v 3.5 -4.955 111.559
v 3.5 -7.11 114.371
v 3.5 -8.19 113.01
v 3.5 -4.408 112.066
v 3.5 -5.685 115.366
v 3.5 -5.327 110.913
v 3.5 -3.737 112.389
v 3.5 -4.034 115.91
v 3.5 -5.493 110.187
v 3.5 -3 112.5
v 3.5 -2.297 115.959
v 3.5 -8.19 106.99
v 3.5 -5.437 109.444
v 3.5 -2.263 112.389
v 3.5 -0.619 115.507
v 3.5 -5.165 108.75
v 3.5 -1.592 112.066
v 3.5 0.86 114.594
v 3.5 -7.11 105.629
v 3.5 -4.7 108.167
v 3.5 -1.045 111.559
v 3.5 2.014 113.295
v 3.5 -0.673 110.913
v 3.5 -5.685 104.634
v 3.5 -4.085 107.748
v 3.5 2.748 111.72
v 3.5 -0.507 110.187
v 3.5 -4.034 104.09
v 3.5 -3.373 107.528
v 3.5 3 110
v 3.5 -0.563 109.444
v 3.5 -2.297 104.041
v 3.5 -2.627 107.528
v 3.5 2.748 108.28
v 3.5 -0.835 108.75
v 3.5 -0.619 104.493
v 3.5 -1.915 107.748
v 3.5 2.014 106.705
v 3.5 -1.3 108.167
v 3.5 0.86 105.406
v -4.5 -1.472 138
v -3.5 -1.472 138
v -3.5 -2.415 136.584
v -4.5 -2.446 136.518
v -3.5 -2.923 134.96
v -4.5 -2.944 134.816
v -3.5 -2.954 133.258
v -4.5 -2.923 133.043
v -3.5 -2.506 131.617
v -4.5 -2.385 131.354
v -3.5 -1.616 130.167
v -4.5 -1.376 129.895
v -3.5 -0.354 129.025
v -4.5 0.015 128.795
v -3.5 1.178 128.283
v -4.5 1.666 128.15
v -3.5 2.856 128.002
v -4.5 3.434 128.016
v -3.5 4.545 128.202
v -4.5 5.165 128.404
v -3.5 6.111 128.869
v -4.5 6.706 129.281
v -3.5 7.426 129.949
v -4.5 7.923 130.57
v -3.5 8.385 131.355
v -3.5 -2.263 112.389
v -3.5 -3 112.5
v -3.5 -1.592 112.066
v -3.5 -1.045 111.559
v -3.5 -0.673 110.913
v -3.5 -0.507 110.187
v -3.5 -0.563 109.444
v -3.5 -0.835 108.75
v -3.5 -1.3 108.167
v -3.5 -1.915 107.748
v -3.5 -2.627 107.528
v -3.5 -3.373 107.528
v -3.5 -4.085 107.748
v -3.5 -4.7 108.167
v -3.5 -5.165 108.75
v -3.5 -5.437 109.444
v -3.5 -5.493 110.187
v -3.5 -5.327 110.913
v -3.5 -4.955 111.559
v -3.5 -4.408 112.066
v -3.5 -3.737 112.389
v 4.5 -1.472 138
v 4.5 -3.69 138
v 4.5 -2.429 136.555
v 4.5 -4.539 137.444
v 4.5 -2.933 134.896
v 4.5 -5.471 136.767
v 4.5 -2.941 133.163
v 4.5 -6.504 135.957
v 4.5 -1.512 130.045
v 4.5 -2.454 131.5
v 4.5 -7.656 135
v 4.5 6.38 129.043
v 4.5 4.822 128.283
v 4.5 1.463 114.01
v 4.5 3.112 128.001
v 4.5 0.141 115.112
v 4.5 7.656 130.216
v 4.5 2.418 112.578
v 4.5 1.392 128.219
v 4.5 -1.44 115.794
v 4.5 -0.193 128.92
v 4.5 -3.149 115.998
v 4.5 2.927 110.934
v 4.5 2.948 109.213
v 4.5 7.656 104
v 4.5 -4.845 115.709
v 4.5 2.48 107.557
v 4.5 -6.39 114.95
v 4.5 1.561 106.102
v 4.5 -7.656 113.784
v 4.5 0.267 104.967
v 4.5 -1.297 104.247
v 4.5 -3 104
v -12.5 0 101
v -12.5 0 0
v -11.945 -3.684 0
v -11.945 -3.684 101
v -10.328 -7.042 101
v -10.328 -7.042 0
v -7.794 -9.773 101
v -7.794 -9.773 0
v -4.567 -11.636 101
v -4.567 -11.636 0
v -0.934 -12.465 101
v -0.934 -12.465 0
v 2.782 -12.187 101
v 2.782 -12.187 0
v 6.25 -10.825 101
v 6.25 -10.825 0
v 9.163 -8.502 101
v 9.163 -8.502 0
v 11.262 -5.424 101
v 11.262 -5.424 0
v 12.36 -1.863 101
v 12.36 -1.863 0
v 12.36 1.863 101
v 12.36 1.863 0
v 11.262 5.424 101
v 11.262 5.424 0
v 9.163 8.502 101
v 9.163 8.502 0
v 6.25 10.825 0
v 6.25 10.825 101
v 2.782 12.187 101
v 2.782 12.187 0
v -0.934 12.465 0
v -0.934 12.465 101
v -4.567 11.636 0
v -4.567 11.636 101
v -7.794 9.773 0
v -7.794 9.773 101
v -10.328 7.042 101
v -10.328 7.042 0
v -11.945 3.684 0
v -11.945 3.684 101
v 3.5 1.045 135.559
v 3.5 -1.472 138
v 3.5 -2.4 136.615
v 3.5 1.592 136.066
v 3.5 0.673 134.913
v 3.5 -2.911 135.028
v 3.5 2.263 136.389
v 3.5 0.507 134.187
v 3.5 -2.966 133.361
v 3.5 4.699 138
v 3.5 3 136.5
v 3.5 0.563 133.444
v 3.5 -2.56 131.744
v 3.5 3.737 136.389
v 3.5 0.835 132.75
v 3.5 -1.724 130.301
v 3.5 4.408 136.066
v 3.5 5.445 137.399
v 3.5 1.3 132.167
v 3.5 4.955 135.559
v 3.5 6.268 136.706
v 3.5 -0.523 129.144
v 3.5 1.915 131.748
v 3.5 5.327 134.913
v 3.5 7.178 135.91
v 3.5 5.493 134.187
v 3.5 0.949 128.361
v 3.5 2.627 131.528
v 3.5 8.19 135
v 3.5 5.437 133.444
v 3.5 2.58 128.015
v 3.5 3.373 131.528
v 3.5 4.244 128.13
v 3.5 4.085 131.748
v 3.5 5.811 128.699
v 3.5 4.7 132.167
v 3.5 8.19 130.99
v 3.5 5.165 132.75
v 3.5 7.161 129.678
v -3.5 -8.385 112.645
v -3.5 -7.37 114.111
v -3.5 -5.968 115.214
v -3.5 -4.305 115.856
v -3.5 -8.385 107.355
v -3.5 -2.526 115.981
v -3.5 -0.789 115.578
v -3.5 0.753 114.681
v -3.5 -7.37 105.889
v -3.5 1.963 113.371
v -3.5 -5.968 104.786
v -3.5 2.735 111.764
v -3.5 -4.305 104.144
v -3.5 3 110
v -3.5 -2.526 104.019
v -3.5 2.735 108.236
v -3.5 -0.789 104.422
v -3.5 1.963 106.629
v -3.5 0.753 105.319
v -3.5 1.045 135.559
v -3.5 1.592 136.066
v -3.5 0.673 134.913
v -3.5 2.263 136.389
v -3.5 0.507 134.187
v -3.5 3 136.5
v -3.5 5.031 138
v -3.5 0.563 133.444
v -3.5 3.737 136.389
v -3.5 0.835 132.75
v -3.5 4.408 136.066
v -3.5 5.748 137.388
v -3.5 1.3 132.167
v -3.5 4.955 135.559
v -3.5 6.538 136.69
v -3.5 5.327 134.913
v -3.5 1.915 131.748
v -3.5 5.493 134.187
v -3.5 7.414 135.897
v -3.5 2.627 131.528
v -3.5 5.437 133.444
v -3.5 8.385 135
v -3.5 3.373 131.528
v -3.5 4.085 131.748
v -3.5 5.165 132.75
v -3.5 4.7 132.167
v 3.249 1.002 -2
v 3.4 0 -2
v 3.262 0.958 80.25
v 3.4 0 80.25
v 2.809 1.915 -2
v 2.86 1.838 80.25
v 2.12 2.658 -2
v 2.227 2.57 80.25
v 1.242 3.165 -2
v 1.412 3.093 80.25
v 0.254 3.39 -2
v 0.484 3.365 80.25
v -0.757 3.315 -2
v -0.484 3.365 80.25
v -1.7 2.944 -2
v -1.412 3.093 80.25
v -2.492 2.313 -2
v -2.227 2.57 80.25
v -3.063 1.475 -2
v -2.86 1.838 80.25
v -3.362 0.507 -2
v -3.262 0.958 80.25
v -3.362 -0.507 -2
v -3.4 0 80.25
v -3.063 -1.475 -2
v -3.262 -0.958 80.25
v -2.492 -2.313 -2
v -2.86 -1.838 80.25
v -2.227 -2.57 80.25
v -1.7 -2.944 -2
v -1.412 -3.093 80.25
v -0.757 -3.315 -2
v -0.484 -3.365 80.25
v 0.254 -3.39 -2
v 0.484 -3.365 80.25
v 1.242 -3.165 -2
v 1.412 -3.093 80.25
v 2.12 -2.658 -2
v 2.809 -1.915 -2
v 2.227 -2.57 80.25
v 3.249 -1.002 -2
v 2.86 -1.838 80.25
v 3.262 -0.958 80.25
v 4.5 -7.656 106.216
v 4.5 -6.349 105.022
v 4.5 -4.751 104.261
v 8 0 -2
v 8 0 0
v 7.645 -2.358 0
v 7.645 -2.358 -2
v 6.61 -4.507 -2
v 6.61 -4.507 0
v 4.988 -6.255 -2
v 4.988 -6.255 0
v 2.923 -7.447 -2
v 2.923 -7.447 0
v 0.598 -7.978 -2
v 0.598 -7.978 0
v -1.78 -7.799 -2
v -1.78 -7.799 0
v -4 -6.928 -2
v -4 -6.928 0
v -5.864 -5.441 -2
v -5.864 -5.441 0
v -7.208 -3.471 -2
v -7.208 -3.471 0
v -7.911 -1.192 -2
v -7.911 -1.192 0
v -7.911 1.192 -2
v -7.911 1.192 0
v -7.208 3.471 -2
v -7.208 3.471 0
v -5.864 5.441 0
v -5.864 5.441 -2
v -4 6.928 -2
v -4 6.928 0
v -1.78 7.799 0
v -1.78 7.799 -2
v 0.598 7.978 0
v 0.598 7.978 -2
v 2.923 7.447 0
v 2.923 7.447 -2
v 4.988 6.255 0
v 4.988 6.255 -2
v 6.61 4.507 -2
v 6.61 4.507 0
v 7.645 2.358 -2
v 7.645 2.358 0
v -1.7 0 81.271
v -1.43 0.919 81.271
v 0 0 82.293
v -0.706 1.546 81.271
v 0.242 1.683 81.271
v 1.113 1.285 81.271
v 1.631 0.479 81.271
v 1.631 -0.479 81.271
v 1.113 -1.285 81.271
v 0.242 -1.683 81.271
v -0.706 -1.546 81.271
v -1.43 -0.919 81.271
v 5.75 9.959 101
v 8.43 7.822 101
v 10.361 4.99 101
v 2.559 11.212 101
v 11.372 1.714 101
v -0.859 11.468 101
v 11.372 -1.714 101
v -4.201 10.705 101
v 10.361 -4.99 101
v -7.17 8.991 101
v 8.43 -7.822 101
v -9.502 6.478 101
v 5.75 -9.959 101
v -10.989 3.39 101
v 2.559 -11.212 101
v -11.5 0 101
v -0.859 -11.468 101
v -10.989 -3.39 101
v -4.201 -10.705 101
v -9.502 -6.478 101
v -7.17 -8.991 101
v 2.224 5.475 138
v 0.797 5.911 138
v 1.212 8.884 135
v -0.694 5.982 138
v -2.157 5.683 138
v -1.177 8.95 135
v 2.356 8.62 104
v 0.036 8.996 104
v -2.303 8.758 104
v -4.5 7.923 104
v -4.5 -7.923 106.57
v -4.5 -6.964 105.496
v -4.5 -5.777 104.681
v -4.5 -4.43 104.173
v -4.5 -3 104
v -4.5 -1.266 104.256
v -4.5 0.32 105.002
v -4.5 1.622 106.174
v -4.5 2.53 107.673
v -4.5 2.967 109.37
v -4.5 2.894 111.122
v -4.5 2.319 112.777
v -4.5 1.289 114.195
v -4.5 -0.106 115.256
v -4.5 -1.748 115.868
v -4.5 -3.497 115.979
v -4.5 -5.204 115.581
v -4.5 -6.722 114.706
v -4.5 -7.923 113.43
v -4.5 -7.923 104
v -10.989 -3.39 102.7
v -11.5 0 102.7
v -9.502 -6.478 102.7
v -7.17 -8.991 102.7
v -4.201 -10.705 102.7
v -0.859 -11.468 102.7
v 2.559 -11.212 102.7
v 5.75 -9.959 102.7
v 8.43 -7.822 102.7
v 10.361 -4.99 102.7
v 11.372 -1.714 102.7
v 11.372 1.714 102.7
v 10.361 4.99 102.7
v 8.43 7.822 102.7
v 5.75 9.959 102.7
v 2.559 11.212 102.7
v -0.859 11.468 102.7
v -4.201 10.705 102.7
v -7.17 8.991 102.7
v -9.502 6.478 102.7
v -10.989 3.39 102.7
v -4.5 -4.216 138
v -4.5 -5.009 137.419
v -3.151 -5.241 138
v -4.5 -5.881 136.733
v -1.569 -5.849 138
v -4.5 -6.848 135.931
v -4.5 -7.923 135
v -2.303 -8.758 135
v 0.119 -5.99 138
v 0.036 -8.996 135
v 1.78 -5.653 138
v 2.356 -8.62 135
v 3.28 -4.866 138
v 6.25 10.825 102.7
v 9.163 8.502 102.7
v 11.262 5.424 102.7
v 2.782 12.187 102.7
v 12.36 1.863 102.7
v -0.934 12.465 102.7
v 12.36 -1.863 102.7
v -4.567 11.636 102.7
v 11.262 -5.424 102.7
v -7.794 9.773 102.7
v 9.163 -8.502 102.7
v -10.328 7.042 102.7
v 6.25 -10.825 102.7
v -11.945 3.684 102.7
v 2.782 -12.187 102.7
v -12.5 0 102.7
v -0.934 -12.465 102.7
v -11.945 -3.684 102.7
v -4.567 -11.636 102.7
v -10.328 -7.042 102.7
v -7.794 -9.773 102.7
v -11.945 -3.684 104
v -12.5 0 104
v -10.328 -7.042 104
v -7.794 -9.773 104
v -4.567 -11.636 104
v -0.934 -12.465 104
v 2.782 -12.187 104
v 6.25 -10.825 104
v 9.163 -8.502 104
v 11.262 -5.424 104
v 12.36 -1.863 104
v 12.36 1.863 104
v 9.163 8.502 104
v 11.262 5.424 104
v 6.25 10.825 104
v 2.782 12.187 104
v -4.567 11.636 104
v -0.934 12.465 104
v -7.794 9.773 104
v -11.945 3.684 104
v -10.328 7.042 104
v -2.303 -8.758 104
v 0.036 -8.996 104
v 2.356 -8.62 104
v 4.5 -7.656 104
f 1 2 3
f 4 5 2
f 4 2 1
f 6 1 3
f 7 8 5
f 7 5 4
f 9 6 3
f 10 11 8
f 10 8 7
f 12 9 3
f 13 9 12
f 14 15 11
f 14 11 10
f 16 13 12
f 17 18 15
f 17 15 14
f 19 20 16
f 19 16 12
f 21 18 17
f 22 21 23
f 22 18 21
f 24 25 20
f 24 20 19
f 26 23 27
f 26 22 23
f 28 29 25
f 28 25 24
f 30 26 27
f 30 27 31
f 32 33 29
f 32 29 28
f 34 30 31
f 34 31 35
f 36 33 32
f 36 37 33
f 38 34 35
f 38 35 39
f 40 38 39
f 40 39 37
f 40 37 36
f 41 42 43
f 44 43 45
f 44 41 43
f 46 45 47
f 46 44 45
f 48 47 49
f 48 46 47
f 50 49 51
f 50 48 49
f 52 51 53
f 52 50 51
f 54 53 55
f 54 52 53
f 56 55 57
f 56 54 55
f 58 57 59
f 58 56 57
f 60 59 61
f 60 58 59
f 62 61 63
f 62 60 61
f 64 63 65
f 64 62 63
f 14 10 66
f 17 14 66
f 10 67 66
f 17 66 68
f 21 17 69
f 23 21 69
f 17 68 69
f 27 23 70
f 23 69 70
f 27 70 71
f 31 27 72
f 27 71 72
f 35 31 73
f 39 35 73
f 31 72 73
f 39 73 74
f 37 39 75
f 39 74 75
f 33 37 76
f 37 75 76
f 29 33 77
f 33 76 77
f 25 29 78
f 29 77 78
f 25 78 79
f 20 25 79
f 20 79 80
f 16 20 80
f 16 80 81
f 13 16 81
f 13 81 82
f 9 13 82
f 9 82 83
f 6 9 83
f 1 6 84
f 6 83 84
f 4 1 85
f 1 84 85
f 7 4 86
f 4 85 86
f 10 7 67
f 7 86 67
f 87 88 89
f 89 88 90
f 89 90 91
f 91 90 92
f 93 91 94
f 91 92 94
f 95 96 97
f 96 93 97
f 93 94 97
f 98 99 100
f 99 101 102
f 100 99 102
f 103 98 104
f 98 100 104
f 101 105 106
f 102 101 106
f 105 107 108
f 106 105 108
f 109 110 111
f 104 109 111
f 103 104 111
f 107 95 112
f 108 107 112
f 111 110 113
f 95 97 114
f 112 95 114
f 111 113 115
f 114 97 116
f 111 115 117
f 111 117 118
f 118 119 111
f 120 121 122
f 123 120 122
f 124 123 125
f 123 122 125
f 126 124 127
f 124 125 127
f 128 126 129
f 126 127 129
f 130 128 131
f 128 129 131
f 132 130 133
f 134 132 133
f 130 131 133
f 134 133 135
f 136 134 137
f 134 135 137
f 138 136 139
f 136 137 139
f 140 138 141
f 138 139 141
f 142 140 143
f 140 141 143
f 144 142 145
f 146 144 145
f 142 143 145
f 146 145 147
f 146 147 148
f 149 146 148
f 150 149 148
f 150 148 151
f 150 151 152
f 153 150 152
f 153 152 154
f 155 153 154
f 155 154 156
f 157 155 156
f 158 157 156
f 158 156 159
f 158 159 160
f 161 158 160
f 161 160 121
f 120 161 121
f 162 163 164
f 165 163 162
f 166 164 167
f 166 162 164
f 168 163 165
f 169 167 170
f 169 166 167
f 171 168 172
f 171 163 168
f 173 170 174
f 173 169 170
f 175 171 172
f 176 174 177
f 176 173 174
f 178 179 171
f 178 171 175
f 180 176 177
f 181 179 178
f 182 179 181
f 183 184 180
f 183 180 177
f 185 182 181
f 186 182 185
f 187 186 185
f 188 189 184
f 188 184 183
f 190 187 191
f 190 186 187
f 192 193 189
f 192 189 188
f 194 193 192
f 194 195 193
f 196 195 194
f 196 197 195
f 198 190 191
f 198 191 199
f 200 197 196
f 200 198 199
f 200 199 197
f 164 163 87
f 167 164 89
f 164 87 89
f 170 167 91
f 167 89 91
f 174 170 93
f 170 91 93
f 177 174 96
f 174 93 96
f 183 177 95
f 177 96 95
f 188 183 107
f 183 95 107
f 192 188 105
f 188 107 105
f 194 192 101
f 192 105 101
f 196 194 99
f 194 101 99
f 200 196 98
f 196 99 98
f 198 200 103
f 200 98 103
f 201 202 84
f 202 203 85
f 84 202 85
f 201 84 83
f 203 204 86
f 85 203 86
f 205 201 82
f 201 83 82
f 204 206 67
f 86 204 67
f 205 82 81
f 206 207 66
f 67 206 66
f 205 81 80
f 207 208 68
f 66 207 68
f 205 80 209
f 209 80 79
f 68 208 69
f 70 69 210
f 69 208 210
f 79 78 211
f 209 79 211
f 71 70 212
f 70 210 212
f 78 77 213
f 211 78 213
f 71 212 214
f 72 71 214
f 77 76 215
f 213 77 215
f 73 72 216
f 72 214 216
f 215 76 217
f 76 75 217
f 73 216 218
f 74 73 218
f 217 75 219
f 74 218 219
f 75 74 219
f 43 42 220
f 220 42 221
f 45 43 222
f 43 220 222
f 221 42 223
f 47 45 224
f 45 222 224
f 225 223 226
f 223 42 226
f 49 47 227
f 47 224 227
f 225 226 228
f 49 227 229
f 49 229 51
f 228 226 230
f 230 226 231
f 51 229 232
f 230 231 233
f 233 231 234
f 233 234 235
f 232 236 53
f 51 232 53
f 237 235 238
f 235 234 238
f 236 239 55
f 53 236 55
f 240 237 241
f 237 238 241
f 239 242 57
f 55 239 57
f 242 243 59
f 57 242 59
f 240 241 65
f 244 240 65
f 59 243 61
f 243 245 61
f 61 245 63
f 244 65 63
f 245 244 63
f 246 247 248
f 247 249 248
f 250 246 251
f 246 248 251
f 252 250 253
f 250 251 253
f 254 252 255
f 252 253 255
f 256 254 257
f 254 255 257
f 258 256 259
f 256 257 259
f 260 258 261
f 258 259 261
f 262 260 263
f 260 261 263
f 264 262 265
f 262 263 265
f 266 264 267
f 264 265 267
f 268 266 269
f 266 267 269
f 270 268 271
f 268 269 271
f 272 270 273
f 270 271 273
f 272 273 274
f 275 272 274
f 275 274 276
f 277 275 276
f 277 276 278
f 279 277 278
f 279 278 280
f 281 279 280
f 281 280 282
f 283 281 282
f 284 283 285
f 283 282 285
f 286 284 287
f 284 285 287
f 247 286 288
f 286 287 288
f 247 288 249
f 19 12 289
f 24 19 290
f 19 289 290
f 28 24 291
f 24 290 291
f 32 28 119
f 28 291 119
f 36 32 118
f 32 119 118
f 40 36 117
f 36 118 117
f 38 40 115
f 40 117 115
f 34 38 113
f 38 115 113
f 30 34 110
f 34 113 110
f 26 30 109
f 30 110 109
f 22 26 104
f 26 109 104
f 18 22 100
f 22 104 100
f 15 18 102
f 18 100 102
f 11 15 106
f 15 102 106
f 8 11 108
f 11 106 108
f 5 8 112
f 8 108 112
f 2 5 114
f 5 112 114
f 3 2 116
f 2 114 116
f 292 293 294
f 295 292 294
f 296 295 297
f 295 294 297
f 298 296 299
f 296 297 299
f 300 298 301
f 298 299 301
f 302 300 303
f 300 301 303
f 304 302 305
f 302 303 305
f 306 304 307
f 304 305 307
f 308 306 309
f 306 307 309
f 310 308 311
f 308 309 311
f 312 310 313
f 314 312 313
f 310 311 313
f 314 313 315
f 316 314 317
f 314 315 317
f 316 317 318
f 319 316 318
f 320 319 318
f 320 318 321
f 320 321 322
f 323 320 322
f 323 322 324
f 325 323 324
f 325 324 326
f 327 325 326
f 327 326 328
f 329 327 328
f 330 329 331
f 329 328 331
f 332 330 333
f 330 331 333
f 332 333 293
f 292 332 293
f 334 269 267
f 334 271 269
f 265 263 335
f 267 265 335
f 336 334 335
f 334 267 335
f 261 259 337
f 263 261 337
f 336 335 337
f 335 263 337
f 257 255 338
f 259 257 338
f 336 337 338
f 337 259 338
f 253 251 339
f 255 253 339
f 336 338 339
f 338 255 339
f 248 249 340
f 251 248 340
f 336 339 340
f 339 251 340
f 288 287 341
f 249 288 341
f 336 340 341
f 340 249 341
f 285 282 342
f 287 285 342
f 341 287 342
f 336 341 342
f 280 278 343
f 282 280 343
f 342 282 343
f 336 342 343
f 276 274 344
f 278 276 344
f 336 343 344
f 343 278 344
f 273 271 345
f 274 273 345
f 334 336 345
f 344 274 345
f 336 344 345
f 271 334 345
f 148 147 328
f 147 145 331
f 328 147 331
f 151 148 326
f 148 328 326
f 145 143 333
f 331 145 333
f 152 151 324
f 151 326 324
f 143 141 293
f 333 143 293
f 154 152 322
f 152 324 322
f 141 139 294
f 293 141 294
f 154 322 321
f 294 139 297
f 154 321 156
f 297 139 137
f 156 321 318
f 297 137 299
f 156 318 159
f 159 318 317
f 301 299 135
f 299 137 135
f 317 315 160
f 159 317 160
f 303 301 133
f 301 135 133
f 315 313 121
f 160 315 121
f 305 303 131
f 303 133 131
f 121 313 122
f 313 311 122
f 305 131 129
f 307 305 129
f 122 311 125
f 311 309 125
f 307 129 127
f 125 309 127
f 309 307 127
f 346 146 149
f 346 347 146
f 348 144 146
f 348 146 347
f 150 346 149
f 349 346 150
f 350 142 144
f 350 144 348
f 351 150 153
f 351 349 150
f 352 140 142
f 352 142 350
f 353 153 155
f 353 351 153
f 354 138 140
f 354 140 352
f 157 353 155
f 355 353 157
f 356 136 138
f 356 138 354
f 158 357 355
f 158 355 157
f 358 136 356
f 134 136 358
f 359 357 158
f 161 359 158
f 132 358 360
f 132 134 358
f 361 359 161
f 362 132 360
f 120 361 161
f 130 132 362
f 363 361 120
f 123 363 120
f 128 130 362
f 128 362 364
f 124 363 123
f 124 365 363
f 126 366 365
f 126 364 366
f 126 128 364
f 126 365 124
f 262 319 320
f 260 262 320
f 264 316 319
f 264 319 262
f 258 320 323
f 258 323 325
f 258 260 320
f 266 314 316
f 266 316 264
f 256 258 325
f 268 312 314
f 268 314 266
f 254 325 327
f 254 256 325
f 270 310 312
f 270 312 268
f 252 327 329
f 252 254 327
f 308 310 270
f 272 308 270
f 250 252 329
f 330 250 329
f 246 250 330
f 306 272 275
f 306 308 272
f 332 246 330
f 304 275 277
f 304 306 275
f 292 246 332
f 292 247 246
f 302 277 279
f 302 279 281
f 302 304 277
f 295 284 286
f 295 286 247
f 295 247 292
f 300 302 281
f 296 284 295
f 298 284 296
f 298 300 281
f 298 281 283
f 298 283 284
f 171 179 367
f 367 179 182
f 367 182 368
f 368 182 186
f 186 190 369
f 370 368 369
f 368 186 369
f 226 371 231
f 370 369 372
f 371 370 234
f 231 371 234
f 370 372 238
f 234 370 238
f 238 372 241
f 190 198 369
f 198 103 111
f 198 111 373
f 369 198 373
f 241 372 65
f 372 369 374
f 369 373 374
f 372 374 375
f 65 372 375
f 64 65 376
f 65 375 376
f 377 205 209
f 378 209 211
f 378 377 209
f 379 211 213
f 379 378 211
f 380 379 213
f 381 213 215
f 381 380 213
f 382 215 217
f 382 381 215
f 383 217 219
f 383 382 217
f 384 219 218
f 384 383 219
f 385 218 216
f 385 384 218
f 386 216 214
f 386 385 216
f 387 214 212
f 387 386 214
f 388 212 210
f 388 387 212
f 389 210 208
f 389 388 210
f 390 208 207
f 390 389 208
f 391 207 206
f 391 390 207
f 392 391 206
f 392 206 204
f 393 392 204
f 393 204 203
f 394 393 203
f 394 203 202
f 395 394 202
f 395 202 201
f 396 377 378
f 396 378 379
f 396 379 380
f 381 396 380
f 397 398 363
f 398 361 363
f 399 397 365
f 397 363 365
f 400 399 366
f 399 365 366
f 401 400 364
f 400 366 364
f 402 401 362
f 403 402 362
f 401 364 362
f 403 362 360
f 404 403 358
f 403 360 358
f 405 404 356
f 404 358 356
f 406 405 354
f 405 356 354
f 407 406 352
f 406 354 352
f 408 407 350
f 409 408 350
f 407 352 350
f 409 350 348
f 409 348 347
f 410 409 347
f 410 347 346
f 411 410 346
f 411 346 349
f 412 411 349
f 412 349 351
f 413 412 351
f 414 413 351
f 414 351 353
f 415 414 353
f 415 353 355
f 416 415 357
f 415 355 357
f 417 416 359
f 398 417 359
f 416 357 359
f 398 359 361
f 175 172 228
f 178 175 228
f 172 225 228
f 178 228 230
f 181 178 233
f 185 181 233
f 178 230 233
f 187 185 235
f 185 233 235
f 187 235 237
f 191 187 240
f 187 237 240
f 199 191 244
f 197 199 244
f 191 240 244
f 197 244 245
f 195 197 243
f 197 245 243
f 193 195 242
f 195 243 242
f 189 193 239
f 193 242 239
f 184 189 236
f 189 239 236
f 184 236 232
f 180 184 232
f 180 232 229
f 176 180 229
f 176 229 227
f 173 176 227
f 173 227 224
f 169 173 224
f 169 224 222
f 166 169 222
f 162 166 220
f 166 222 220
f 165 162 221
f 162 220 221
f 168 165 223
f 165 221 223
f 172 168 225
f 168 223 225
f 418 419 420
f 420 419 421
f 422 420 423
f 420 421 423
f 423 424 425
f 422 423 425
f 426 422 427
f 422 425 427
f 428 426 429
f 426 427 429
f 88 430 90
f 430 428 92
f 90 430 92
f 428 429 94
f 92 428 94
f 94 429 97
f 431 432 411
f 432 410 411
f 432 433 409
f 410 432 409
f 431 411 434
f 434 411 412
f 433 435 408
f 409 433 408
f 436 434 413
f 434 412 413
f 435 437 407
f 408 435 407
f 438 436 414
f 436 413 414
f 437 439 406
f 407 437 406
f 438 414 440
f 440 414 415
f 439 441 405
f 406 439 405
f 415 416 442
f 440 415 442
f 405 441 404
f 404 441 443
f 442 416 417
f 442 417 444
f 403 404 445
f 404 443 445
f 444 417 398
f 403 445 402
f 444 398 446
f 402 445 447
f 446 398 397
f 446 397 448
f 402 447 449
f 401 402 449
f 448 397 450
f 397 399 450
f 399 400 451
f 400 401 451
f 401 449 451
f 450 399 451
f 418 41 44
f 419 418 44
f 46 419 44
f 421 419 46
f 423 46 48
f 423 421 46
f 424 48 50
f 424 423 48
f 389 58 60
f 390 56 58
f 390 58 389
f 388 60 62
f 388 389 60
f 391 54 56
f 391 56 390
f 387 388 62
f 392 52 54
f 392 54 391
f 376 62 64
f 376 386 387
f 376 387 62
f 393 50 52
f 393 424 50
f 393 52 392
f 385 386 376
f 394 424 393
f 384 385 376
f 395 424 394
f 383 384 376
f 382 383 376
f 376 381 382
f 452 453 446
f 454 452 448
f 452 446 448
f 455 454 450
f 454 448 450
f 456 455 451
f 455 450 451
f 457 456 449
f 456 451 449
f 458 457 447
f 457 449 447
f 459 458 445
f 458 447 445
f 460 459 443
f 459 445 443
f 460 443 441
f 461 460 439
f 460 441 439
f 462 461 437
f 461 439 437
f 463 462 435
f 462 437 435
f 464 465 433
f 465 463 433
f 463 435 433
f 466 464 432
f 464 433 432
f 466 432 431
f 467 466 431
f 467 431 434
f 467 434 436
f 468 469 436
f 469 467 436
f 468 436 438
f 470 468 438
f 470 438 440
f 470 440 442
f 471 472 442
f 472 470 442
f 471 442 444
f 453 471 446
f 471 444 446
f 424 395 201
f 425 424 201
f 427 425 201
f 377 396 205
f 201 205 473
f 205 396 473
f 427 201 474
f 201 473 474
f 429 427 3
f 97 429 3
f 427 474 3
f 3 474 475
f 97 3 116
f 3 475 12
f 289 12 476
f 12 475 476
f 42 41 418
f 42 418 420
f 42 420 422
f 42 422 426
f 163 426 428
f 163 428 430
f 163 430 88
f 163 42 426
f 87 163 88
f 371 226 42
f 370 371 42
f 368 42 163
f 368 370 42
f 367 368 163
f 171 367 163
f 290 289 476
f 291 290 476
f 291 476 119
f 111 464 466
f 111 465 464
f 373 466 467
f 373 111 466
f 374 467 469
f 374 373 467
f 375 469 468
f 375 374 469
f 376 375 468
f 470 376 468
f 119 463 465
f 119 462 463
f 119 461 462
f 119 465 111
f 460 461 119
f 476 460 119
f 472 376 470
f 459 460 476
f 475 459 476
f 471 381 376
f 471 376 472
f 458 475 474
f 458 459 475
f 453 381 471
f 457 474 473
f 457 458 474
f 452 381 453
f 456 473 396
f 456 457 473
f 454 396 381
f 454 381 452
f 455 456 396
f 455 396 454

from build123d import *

# Parameters (mm, degrees)
SKETCH_1_R               = 12.5
EXTRUDE_1_DEPTH          = 104
SKETCH_6_W               = 1
SKETCH_6_H               = 1.7
SKETCH_7_R               = 8
EXTRUDE_2_DEPTH          = 2
HOLE_WIZARD_M8_1_D       = 6.8
HOLE_WIZARD_M8_1_DEPTH   = 82.25
HOLE_WIZARD_M8_1_TIP     = 2.042926105
SKETCH_9_R               = 9
EXTRUDE_3_DEPTH          = 34
CUT_EXTRUDE_1_DEPTH      = 140.127639238
CUT_EXTRUDE_1_DEPTH_BACK = 140.127639238
SKETCH_8_W               = 34
SKETCH_8_H               = 10.443945465
CHAMFER_1_SIZE           = 3
HOLE_WIZARD_5_0_5_1_D    = 5
SKETCH_13_R              = 6
CUT_EXTRUDE_3_DEPTH      = 1


with BuildPart() as part:
    # 草图1 → 凸台-拉伸1 (new body)
    with BuildSketch(Plane.XY):
        with Locations(Location((0, 0, 0), (0, 0, 180))):
            Circle(SKETCH_1_R)
    extrude(amount=EXTRUDE_1_DEPTH)

    # 草图6 → 切除-旋转1 (revolve, cut)
    with BuildSketch(Plane(origin=(0, 0, 0), x_dir=(1, 0, 0), z_dir=(0, 1, 0))):
        with Locations((-12, -101.85)):
            Rectangle(SKETCH_6_W, SKETCH_6_H)
    revolve(axis=Axis((0, 0, 0), (0, 0, 1)), mode=Mode.SUBTRACT)

    # 草图7 → 凸台-拉伸2 (add)
    with BuildSketch(Plane(origin=(0, 0, 0), x_dir=(-1, 0, 0), z_dir=(0, 0, -1))):
        with Locations(Location((0, 0, 0), (0, 0, 180))):
            Circle(SKETCH_7_R)
    extrude(amount=EXTRUDE_2_DEPTH)

    # M8 螺纹孔1
    with Locations(Plane(origin=(0, 0, -2), x_dir=(-1, 0, 0), z_dir=(0, 0, -1))):
        with Locations((0, 0)):
            Hole(HOLE_WIZARD_M8_1_D / 2, depth=HOLE_WIZARD_M8_1_DEPTH)
            with Locations((0, 0, -(HOLE_WIZARD_M8_1_DEPTH + HOLE_WIZARD_M8_1_TIP / 2))):  # 118° drill point
                Cone(0, HOLE_WIZARD_M8_1_D / 2, HOLE_WIZARD_M8_1_TIP, mode=Mode.SUBTRACT)

    # 草图9 → 凸台-拉伸3 (add)
    with BuildSketch(Plane.XY.offset(104)):
        with Locations((-0.231058247, 0)):
            Circle(SKETCH_9_R)
    extrude(amount=EXTRUDE_3_DEPTH)

    # 草图8 → 切除-拉伸1 (cut, two sides: drawn at the far end of the back side and taken through both)
    with BuildSketch(Plane(origin=(0, 0, 0), x_dir=(0, 0, -1), z_dir=(0, 1, 0)).offset(-CUT_EXTRUDE_1_DEPTH_BACK)):
        with Locations((-121, 9.721972732)):
            Rectangle(SKETCH_8_W, SKETCH_8_H)
        with Locations((-121, -9.721972732)):
            Rectangle(SKETCH_8_W, SKETCH_8_H)
    extrude(amount=CUT_EXTRUDE_1_DEPTH + CUT_EXTRUDE_1_DEPTH_BACK, mode=Mode.SUBTRACT)

    # 倒角1
    chamfer_1_edges = [part.edges().sort_by_distance(p)[0] for p in [
        (0.035783968, -8.99604331, 138),
        (0.035783968, 8.99604331, 138),
    ]]
    chamfer(chamfer_1_edges, length=CHAMFER_1_SIZE)

    # Ø5.0 (5) 直径孔1 (through all)
    with Locations(Plane(origin=(4.5, 0, 0), x_dir=(0, 0, -1), z_dir=(1, 0, 0))):
        with Locations((-110, -3), (-134, 3)):
            Hole(HOLE_WIZARD_5_0_5_1_D / 2)

    # 草图13 → 切除-拉伸3 (cut)
    with BuildSketch(Plane(origin=(4.5, 0, 0), x_dir=(0, 0, -1), z_dir=(1, 0, 0))):
        with Locations((-134, 3)):
            Circle(SKETCH_13_R)
        with Locations((-110, -3)):
            Circle(SKETCH_13_R)
    cut_extrude_3 = extrude(amount=-CUT_EXTRUDE_3_DEPTH, mode=Mode.SUBTRACT)

    # 镜向1: 切除-拉伸3 across plane
    add(cut_extrude_3.mirror(Plane(origin=(0, 0, 0), x_dir=(0, 0, 1), z_dir=(1, 0, 0))), mode=Mode.SUBTRACT)


solid = part.part
